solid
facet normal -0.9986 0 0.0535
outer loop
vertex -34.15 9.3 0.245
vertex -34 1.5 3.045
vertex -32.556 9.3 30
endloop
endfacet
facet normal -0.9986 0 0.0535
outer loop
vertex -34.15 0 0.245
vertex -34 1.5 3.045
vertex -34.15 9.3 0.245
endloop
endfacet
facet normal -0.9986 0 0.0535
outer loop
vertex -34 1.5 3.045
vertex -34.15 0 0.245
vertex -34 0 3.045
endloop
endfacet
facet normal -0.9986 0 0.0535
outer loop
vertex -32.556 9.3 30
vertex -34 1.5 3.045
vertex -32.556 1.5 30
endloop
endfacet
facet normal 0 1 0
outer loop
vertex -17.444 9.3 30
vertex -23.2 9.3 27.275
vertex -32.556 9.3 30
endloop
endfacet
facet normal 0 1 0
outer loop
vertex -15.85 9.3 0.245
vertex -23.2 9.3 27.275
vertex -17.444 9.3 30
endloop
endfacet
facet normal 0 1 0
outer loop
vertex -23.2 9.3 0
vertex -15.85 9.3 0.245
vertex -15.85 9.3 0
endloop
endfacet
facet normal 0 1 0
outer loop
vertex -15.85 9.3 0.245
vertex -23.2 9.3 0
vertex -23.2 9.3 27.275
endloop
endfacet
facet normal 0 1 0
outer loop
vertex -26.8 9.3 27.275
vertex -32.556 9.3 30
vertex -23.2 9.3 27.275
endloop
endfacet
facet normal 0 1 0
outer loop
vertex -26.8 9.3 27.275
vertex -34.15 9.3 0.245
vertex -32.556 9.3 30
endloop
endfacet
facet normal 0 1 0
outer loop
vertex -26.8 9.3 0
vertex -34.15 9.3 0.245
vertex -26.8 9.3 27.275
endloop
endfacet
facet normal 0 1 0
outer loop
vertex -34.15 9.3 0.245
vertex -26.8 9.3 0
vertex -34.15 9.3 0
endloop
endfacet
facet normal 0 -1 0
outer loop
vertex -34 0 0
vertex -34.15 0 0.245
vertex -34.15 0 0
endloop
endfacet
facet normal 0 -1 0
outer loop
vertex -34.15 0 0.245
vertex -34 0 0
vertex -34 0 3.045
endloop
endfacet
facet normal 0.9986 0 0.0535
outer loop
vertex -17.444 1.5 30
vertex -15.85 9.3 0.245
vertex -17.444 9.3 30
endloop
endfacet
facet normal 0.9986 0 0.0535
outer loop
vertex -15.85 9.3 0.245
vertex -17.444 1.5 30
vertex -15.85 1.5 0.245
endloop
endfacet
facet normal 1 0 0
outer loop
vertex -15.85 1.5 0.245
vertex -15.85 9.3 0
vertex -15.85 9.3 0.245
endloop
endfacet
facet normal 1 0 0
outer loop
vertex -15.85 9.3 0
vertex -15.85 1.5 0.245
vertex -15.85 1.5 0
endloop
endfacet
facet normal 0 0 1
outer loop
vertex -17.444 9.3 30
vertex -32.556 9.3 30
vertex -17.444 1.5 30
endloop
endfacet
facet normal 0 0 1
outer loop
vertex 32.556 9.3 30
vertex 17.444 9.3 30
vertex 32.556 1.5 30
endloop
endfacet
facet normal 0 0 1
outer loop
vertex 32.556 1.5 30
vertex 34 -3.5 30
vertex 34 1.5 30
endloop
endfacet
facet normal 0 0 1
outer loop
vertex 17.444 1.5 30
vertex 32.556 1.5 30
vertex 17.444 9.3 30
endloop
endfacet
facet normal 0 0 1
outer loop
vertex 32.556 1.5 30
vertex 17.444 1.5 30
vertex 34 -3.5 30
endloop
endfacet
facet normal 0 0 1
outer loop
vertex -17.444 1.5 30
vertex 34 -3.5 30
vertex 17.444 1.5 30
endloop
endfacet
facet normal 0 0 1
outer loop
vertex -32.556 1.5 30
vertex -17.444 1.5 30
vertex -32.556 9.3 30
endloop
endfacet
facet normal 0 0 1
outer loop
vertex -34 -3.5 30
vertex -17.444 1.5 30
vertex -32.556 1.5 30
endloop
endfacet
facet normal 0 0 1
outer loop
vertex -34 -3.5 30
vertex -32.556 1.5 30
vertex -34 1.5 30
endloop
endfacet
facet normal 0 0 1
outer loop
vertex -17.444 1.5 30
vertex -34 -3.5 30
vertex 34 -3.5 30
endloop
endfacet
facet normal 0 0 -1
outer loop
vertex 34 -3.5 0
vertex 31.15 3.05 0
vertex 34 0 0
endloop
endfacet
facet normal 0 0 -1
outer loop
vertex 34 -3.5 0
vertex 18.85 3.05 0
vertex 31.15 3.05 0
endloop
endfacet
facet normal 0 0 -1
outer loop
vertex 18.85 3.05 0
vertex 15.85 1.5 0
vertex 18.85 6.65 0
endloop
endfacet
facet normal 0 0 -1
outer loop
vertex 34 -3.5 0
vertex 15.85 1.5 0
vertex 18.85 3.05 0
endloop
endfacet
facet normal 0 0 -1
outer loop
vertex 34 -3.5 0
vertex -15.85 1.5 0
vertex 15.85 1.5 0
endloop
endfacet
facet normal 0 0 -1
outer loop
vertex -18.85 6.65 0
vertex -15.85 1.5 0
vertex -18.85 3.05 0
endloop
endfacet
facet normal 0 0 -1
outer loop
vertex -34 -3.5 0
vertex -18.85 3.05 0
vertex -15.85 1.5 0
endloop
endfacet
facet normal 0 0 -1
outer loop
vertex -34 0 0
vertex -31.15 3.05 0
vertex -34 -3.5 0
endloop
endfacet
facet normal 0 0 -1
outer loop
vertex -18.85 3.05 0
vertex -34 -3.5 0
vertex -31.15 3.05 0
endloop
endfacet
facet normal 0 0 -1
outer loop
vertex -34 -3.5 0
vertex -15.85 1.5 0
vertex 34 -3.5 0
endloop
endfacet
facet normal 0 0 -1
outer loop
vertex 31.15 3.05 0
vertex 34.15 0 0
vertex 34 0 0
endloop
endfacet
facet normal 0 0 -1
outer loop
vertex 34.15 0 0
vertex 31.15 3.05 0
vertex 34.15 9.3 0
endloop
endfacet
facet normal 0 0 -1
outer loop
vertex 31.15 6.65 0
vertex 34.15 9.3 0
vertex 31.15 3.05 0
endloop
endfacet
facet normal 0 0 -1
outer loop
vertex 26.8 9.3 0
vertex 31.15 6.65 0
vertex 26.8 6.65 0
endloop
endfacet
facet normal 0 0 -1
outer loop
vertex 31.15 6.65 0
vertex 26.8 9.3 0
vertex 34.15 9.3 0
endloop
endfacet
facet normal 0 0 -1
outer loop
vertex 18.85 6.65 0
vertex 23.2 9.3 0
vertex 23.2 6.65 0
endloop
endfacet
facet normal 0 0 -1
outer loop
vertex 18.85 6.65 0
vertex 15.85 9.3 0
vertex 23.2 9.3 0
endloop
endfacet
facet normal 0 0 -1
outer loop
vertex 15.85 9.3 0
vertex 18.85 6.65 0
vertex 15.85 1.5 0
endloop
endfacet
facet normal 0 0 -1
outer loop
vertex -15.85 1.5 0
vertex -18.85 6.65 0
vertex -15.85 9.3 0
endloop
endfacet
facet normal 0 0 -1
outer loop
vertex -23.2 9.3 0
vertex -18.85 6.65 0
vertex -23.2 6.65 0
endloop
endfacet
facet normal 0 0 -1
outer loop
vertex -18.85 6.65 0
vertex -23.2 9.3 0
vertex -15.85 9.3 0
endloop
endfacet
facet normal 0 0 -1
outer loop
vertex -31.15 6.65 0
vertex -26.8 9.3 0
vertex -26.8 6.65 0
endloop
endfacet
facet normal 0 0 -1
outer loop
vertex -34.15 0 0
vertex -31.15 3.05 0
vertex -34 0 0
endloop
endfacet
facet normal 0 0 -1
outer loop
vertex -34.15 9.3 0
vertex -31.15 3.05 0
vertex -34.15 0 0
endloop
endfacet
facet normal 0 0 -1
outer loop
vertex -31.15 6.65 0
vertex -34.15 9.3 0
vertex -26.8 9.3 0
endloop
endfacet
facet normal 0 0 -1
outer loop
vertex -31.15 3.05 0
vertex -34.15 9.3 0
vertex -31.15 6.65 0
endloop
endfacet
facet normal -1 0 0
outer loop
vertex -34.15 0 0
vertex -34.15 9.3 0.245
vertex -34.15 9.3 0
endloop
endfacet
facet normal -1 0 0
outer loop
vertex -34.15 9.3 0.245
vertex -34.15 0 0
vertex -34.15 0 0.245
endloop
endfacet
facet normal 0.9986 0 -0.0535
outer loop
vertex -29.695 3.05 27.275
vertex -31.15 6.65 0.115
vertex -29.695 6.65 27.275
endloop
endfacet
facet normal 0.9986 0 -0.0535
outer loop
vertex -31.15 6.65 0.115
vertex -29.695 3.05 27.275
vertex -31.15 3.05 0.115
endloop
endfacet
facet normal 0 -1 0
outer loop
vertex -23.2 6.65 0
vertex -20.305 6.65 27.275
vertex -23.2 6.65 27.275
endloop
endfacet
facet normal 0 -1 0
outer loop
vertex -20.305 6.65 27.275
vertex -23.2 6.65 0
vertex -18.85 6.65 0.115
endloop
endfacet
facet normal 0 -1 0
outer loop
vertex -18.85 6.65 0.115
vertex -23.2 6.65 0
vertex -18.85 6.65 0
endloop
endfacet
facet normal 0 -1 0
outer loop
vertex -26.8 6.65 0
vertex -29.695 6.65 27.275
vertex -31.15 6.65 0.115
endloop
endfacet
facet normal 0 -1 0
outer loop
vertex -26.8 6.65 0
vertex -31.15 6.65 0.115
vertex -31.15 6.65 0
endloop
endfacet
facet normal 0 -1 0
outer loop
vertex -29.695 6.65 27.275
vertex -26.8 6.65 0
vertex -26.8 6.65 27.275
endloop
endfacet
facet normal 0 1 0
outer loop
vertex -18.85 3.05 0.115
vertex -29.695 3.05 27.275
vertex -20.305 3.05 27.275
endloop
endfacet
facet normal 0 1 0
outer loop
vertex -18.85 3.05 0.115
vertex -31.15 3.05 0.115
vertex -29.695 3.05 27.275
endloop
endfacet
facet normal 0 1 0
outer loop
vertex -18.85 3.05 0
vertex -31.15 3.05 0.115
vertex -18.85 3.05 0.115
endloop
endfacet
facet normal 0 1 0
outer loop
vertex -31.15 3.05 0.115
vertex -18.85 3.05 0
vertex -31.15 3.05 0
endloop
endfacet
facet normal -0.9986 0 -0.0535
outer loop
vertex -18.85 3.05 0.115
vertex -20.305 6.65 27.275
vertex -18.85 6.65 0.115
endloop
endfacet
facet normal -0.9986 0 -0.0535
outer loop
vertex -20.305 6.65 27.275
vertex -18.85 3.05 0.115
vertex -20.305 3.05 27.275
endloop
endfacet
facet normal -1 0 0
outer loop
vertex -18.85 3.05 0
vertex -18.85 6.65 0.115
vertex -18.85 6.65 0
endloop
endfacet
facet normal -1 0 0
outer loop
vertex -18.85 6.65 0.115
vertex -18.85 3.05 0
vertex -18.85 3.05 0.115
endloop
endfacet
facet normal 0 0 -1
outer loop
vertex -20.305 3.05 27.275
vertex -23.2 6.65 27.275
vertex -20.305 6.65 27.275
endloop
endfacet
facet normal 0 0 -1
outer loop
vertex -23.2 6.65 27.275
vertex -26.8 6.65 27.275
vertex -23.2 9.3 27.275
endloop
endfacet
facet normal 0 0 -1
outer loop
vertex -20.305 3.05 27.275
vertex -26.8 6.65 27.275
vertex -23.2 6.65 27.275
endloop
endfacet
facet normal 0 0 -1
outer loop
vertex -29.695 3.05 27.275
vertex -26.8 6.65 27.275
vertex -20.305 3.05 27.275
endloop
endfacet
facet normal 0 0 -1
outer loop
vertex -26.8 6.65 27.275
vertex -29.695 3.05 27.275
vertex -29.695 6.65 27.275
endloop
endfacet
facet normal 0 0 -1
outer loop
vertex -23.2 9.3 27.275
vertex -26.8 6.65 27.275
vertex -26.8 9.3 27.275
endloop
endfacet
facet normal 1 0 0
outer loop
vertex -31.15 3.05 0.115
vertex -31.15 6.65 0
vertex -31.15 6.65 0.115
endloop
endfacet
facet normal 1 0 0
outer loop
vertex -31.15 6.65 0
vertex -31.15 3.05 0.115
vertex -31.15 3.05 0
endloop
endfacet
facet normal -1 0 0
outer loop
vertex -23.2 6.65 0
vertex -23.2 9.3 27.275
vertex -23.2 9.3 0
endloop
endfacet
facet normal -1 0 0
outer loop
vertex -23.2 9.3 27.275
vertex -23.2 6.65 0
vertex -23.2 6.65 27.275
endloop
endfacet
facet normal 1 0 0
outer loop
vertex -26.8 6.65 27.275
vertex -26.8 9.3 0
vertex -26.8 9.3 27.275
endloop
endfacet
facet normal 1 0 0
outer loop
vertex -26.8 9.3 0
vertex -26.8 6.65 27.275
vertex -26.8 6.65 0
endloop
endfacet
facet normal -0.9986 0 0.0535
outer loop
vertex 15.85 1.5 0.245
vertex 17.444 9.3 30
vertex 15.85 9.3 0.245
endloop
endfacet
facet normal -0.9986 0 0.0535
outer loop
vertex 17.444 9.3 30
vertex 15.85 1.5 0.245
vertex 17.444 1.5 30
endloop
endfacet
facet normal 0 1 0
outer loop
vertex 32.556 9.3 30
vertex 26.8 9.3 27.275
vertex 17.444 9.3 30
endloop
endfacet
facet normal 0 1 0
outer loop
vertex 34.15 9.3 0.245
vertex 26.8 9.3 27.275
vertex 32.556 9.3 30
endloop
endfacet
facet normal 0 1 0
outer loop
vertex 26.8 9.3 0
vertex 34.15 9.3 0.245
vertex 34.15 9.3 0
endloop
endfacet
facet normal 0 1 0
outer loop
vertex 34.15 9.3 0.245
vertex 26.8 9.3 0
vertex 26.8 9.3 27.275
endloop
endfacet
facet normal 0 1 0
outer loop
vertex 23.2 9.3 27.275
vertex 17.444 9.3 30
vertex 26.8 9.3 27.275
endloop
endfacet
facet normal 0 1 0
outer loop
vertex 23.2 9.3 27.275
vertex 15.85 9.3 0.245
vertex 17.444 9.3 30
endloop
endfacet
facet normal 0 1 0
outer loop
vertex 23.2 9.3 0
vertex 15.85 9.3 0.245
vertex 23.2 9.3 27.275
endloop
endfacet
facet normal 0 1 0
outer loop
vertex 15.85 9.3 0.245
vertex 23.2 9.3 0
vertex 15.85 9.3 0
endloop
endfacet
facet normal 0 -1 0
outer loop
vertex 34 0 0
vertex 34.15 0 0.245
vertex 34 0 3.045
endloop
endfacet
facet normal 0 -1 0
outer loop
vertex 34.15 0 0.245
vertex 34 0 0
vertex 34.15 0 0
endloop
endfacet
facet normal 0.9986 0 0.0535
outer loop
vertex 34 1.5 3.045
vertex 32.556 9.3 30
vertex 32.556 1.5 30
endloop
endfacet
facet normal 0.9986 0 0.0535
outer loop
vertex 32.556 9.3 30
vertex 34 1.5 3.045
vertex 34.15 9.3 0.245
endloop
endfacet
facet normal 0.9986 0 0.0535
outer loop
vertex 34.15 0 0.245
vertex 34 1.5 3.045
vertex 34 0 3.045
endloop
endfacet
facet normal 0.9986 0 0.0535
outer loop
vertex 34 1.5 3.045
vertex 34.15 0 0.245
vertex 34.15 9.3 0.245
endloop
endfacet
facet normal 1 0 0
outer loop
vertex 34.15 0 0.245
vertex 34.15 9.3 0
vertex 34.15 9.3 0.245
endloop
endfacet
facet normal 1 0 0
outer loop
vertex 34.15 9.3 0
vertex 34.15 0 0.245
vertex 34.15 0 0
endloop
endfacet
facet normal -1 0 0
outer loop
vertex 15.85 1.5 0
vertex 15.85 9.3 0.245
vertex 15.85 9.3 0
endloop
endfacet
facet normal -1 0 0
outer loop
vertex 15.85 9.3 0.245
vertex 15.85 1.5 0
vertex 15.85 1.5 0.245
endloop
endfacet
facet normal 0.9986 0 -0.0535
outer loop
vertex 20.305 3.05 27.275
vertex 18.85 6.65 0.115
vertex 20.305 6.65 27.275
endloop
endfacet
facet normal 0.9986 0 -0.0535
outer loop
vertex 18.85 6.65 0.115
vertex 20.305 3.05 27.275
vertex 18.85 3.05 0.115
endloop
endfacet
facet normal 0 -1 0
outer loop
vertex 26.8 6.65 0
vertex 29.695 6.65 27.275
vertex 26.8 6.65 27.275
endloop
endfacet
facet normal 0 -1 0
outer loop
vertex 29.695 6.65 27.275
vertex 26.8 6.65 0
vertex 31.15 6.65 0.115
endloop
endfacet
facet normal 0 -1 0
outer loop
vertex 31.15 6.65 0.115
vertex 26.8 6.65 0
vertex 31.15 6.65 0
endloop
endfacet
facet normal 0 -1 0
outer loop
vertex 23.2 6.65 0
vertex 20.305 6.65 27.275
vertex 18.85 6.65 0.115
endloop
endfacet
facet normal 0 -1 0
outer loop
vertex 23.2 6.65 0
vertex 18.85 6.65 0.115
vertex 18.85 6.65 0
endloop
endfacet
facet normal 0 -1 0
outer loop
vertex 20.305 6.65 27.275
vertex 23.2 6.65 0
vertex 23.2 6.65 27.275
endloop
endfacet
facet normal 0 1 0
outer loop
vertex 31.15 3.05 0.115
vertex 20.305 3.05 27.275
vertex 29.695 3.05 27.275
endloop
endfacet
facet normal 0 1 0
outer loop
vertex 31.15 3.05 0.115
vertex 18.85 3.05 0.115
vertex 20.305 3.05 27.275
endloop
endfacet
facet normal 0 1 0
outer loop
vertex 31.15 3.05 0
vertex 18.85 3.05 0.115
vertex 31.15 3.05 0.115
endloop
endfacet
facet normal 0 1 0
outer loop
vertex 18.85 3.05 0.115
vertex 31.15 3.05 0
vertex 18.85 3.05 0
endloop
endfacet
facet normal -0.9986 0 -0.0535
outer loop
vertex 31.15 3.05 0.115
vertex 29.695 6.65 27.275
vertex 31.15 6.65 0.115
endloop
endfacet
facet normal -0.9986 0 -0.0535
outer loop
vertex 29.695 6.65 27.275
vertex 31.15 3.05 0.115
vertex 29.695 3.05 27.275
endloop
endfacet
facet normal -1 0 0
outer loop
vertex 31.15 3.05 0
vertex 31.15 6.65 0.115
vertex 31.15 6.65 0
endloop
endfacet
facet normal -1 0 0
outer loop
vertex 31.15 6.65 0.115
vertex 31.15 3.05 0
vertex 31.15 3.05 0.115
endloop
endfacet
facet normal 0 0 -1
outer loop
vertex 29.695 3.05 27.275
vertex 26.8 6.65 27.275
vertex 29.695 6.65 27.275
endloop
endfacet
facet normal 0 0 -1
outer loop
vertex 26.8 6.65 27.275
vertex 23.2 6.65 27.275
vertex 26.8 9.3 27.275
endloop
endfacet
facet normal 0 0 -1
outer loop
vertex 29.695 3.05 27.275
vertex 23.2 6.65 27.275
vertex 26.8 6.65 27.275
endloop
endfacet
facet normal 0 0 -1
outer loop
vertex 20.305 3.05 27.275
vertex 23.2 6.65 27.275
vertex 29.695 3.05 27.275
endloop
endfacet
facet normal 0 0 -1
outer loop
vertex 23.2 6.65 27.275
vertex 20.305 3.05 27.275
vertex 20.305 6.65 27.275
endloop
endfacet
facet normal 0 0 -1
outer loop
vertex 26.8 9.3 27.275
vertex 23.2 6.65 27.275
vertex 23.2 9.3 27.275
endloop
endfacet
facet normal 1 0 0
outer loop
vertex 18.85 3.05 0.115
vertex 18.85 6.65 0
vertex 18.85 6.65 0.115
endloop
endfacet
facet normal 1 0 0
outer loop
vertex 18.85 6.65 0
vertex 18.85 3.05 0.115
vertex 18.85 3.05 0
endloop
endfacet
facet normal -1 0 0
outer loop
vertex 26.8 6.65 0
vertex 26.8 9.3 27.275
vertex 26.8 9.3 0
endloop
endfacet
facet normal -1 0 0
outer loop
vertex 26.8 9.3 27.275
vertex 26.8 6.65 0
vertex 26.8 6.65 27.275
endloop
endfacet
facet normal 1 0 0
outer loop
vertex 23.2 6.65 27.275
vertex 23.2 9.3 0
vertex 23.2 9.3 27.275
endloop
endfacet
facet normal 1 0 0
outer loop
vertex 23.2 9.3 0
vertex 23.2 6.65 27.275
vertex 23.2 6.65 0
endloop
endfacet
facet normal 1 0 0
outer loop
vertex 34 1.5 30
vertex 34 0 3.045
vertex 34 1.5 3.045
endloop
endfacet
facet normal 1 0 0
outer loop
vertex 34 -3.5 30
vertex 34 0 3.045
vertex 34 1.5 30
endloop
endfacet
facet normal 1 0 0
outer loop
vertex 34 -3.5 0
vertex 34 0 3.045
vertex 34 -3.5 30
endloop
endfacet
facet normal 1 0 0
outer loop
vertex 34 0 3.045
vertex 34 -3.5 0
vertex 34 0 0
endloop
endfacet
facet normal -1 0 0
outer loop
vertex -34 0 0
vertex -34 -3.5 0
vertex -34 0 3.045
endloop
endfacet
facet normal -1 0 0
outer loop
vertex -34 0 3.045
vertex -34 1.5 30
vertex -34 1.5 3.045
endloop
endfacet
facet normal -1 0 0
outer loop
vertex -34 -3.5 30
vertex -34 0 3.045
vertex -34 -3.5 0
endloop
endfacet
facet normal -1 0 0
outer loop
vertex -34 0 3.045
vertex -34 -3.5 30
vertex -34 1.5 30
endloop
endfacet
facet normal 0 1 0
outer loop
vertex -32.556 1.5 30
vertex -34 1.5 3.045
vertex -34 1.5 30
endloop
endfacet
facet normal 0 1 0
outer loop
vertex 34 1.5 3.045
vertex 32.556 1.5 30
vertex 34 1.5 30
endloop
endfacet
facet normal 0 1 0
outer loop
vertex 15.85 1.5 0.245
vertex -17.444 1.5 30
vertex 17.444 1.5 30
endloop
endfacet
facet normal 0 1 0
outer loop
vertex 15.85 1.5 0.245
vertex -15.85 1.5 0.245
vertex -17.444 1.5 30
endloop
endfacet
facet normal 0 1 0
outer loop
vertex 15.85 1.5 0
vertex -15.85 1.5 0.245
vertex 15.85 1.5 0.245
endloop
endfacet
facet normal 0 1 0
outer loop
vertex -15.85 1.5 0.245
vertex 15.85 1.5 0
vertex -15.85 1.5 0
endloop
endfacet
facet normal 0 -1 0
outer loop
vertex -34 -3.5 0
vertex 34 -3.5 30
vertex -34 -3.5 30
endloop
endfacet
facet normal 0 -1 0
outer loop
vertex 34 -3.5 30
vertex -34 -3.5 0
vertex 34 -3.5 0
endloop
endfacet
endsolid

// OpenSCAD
// file: tslot.scad
include <config.scad>
use <GDMUtils.scad>



module lock_tab(h=30, wall=3, slop=0.0)
{
	s1 = 2*wall-slop/2;
	s2 = wall-slop/2;
	ang = atan(((s1-s2)/2)/(h-2));
	translate([0, -(1.5*wall), 0]) union () {
		intersection() {
			yrot( ang) translate([0,0,(h+5)/2])
				cube(size=[s1*2, wall-2*slop, h+10], center=true);
			yrot(-ang) translate([0,0,(h+5)/2])
				cube(size=[s1*2, wall-2*slop, h+10], center=true);
			translate([0,0,(h-wall-slop)/2])
				cube(size=[s1*2, wall-2*slop, h-wall-slop+0.05], center=true);
		}
	}
	translate([0, -(wall+slop/2)/2-0.05, (h-wall-slop)/2])
		cube(size=[wall-2*slop, wall+slop/2+0.1, h-wall-slop+0.05], center=true);
}
//lock_tab(h=30, wall=2, slop=-0.9);



module lock_slot(h=30, wall=3, backing=0, slop=0.3)
{
	s1 = 2*wall+slop/2;
	s2 = wall+slop/2;
	w = 2*s1+2*wall;
	d = wall*3+slop;
	ang = atan(((s1-s2)/2)/(h-2));
	translate([0, (d+backing)/2, 0]) {
		difference() {
			intersection() {
				yrot( ang) translate([0, 0, (h+5)/2])
					cube(size=[w, d+backing, h+10], center=true);
				yrot(-ang) translate([0, 0, (h+5)/2])
					cube(size=[w, d+backing, h+10], center=true);
				translate([0, 0, h/2])
					cube(size=[w, d+backing, h], center=true);
			}
			translate([0, (d+backing)/2+0.05, -0.05])
				lock_tab(h=h, wall=wall, slop=-slop);
		}
	}
}
//!lock_slot(h=30, wall=2, slop=0.5);



// vim: noexpandtab tabstop=4 shiftwidth=4 softtabstop=4 nowrap
// file: config.scad
snappy_version = 0.90;


platform_length = 100;
platform_width  = 150;
platform_height =  40;
platform_thick  =   7;
rack_tooth_size =   5;  // mm per tooth.

rail_length  = 150;
rail_height  =  50;
rail_thick   =   7;

motor_rail_length = 100;

roller_thick =  12;
roller_diam  =  30;
roller_axle  =  15;
roller_angle =  30;
roller_base  =  12;

joiner_angle =  30;
joiner_width =   9;
joiner_slop  =   0.5;



rail_spacing = platform_width - joiner_width*4 - 10;
roller_spacing = rail_spacing-roller_diam+0.5;
rail_width = rail_spacing + joiner_width*2;



// vim: noexpandtab tabstop=4 shiftwidth=4 softtabstop=4 nowrap
// main file
include <config.scad>
use <GDMUtils.scad>
use <tslot.scad>


module testslot(h=30, l=100, wall=3)
{
	ang = atan((h-10)/l);
	union() {
		translate([0, -1, h/2])
			cube(size=[platform_length/2+6*wall, 5, h], center=true);
		grid_of(xa=[-platform_length/4, platform_length/4]) {
			lock_slot(h=h, wall=wall);
		}
	}
}
//!testslot();



module testslot_part() { // make me
	testslot();
}



testslot_part();



// vim: noexpandtab tabstop=4 shiftwidth=4 softtabstop=4 nowrap
